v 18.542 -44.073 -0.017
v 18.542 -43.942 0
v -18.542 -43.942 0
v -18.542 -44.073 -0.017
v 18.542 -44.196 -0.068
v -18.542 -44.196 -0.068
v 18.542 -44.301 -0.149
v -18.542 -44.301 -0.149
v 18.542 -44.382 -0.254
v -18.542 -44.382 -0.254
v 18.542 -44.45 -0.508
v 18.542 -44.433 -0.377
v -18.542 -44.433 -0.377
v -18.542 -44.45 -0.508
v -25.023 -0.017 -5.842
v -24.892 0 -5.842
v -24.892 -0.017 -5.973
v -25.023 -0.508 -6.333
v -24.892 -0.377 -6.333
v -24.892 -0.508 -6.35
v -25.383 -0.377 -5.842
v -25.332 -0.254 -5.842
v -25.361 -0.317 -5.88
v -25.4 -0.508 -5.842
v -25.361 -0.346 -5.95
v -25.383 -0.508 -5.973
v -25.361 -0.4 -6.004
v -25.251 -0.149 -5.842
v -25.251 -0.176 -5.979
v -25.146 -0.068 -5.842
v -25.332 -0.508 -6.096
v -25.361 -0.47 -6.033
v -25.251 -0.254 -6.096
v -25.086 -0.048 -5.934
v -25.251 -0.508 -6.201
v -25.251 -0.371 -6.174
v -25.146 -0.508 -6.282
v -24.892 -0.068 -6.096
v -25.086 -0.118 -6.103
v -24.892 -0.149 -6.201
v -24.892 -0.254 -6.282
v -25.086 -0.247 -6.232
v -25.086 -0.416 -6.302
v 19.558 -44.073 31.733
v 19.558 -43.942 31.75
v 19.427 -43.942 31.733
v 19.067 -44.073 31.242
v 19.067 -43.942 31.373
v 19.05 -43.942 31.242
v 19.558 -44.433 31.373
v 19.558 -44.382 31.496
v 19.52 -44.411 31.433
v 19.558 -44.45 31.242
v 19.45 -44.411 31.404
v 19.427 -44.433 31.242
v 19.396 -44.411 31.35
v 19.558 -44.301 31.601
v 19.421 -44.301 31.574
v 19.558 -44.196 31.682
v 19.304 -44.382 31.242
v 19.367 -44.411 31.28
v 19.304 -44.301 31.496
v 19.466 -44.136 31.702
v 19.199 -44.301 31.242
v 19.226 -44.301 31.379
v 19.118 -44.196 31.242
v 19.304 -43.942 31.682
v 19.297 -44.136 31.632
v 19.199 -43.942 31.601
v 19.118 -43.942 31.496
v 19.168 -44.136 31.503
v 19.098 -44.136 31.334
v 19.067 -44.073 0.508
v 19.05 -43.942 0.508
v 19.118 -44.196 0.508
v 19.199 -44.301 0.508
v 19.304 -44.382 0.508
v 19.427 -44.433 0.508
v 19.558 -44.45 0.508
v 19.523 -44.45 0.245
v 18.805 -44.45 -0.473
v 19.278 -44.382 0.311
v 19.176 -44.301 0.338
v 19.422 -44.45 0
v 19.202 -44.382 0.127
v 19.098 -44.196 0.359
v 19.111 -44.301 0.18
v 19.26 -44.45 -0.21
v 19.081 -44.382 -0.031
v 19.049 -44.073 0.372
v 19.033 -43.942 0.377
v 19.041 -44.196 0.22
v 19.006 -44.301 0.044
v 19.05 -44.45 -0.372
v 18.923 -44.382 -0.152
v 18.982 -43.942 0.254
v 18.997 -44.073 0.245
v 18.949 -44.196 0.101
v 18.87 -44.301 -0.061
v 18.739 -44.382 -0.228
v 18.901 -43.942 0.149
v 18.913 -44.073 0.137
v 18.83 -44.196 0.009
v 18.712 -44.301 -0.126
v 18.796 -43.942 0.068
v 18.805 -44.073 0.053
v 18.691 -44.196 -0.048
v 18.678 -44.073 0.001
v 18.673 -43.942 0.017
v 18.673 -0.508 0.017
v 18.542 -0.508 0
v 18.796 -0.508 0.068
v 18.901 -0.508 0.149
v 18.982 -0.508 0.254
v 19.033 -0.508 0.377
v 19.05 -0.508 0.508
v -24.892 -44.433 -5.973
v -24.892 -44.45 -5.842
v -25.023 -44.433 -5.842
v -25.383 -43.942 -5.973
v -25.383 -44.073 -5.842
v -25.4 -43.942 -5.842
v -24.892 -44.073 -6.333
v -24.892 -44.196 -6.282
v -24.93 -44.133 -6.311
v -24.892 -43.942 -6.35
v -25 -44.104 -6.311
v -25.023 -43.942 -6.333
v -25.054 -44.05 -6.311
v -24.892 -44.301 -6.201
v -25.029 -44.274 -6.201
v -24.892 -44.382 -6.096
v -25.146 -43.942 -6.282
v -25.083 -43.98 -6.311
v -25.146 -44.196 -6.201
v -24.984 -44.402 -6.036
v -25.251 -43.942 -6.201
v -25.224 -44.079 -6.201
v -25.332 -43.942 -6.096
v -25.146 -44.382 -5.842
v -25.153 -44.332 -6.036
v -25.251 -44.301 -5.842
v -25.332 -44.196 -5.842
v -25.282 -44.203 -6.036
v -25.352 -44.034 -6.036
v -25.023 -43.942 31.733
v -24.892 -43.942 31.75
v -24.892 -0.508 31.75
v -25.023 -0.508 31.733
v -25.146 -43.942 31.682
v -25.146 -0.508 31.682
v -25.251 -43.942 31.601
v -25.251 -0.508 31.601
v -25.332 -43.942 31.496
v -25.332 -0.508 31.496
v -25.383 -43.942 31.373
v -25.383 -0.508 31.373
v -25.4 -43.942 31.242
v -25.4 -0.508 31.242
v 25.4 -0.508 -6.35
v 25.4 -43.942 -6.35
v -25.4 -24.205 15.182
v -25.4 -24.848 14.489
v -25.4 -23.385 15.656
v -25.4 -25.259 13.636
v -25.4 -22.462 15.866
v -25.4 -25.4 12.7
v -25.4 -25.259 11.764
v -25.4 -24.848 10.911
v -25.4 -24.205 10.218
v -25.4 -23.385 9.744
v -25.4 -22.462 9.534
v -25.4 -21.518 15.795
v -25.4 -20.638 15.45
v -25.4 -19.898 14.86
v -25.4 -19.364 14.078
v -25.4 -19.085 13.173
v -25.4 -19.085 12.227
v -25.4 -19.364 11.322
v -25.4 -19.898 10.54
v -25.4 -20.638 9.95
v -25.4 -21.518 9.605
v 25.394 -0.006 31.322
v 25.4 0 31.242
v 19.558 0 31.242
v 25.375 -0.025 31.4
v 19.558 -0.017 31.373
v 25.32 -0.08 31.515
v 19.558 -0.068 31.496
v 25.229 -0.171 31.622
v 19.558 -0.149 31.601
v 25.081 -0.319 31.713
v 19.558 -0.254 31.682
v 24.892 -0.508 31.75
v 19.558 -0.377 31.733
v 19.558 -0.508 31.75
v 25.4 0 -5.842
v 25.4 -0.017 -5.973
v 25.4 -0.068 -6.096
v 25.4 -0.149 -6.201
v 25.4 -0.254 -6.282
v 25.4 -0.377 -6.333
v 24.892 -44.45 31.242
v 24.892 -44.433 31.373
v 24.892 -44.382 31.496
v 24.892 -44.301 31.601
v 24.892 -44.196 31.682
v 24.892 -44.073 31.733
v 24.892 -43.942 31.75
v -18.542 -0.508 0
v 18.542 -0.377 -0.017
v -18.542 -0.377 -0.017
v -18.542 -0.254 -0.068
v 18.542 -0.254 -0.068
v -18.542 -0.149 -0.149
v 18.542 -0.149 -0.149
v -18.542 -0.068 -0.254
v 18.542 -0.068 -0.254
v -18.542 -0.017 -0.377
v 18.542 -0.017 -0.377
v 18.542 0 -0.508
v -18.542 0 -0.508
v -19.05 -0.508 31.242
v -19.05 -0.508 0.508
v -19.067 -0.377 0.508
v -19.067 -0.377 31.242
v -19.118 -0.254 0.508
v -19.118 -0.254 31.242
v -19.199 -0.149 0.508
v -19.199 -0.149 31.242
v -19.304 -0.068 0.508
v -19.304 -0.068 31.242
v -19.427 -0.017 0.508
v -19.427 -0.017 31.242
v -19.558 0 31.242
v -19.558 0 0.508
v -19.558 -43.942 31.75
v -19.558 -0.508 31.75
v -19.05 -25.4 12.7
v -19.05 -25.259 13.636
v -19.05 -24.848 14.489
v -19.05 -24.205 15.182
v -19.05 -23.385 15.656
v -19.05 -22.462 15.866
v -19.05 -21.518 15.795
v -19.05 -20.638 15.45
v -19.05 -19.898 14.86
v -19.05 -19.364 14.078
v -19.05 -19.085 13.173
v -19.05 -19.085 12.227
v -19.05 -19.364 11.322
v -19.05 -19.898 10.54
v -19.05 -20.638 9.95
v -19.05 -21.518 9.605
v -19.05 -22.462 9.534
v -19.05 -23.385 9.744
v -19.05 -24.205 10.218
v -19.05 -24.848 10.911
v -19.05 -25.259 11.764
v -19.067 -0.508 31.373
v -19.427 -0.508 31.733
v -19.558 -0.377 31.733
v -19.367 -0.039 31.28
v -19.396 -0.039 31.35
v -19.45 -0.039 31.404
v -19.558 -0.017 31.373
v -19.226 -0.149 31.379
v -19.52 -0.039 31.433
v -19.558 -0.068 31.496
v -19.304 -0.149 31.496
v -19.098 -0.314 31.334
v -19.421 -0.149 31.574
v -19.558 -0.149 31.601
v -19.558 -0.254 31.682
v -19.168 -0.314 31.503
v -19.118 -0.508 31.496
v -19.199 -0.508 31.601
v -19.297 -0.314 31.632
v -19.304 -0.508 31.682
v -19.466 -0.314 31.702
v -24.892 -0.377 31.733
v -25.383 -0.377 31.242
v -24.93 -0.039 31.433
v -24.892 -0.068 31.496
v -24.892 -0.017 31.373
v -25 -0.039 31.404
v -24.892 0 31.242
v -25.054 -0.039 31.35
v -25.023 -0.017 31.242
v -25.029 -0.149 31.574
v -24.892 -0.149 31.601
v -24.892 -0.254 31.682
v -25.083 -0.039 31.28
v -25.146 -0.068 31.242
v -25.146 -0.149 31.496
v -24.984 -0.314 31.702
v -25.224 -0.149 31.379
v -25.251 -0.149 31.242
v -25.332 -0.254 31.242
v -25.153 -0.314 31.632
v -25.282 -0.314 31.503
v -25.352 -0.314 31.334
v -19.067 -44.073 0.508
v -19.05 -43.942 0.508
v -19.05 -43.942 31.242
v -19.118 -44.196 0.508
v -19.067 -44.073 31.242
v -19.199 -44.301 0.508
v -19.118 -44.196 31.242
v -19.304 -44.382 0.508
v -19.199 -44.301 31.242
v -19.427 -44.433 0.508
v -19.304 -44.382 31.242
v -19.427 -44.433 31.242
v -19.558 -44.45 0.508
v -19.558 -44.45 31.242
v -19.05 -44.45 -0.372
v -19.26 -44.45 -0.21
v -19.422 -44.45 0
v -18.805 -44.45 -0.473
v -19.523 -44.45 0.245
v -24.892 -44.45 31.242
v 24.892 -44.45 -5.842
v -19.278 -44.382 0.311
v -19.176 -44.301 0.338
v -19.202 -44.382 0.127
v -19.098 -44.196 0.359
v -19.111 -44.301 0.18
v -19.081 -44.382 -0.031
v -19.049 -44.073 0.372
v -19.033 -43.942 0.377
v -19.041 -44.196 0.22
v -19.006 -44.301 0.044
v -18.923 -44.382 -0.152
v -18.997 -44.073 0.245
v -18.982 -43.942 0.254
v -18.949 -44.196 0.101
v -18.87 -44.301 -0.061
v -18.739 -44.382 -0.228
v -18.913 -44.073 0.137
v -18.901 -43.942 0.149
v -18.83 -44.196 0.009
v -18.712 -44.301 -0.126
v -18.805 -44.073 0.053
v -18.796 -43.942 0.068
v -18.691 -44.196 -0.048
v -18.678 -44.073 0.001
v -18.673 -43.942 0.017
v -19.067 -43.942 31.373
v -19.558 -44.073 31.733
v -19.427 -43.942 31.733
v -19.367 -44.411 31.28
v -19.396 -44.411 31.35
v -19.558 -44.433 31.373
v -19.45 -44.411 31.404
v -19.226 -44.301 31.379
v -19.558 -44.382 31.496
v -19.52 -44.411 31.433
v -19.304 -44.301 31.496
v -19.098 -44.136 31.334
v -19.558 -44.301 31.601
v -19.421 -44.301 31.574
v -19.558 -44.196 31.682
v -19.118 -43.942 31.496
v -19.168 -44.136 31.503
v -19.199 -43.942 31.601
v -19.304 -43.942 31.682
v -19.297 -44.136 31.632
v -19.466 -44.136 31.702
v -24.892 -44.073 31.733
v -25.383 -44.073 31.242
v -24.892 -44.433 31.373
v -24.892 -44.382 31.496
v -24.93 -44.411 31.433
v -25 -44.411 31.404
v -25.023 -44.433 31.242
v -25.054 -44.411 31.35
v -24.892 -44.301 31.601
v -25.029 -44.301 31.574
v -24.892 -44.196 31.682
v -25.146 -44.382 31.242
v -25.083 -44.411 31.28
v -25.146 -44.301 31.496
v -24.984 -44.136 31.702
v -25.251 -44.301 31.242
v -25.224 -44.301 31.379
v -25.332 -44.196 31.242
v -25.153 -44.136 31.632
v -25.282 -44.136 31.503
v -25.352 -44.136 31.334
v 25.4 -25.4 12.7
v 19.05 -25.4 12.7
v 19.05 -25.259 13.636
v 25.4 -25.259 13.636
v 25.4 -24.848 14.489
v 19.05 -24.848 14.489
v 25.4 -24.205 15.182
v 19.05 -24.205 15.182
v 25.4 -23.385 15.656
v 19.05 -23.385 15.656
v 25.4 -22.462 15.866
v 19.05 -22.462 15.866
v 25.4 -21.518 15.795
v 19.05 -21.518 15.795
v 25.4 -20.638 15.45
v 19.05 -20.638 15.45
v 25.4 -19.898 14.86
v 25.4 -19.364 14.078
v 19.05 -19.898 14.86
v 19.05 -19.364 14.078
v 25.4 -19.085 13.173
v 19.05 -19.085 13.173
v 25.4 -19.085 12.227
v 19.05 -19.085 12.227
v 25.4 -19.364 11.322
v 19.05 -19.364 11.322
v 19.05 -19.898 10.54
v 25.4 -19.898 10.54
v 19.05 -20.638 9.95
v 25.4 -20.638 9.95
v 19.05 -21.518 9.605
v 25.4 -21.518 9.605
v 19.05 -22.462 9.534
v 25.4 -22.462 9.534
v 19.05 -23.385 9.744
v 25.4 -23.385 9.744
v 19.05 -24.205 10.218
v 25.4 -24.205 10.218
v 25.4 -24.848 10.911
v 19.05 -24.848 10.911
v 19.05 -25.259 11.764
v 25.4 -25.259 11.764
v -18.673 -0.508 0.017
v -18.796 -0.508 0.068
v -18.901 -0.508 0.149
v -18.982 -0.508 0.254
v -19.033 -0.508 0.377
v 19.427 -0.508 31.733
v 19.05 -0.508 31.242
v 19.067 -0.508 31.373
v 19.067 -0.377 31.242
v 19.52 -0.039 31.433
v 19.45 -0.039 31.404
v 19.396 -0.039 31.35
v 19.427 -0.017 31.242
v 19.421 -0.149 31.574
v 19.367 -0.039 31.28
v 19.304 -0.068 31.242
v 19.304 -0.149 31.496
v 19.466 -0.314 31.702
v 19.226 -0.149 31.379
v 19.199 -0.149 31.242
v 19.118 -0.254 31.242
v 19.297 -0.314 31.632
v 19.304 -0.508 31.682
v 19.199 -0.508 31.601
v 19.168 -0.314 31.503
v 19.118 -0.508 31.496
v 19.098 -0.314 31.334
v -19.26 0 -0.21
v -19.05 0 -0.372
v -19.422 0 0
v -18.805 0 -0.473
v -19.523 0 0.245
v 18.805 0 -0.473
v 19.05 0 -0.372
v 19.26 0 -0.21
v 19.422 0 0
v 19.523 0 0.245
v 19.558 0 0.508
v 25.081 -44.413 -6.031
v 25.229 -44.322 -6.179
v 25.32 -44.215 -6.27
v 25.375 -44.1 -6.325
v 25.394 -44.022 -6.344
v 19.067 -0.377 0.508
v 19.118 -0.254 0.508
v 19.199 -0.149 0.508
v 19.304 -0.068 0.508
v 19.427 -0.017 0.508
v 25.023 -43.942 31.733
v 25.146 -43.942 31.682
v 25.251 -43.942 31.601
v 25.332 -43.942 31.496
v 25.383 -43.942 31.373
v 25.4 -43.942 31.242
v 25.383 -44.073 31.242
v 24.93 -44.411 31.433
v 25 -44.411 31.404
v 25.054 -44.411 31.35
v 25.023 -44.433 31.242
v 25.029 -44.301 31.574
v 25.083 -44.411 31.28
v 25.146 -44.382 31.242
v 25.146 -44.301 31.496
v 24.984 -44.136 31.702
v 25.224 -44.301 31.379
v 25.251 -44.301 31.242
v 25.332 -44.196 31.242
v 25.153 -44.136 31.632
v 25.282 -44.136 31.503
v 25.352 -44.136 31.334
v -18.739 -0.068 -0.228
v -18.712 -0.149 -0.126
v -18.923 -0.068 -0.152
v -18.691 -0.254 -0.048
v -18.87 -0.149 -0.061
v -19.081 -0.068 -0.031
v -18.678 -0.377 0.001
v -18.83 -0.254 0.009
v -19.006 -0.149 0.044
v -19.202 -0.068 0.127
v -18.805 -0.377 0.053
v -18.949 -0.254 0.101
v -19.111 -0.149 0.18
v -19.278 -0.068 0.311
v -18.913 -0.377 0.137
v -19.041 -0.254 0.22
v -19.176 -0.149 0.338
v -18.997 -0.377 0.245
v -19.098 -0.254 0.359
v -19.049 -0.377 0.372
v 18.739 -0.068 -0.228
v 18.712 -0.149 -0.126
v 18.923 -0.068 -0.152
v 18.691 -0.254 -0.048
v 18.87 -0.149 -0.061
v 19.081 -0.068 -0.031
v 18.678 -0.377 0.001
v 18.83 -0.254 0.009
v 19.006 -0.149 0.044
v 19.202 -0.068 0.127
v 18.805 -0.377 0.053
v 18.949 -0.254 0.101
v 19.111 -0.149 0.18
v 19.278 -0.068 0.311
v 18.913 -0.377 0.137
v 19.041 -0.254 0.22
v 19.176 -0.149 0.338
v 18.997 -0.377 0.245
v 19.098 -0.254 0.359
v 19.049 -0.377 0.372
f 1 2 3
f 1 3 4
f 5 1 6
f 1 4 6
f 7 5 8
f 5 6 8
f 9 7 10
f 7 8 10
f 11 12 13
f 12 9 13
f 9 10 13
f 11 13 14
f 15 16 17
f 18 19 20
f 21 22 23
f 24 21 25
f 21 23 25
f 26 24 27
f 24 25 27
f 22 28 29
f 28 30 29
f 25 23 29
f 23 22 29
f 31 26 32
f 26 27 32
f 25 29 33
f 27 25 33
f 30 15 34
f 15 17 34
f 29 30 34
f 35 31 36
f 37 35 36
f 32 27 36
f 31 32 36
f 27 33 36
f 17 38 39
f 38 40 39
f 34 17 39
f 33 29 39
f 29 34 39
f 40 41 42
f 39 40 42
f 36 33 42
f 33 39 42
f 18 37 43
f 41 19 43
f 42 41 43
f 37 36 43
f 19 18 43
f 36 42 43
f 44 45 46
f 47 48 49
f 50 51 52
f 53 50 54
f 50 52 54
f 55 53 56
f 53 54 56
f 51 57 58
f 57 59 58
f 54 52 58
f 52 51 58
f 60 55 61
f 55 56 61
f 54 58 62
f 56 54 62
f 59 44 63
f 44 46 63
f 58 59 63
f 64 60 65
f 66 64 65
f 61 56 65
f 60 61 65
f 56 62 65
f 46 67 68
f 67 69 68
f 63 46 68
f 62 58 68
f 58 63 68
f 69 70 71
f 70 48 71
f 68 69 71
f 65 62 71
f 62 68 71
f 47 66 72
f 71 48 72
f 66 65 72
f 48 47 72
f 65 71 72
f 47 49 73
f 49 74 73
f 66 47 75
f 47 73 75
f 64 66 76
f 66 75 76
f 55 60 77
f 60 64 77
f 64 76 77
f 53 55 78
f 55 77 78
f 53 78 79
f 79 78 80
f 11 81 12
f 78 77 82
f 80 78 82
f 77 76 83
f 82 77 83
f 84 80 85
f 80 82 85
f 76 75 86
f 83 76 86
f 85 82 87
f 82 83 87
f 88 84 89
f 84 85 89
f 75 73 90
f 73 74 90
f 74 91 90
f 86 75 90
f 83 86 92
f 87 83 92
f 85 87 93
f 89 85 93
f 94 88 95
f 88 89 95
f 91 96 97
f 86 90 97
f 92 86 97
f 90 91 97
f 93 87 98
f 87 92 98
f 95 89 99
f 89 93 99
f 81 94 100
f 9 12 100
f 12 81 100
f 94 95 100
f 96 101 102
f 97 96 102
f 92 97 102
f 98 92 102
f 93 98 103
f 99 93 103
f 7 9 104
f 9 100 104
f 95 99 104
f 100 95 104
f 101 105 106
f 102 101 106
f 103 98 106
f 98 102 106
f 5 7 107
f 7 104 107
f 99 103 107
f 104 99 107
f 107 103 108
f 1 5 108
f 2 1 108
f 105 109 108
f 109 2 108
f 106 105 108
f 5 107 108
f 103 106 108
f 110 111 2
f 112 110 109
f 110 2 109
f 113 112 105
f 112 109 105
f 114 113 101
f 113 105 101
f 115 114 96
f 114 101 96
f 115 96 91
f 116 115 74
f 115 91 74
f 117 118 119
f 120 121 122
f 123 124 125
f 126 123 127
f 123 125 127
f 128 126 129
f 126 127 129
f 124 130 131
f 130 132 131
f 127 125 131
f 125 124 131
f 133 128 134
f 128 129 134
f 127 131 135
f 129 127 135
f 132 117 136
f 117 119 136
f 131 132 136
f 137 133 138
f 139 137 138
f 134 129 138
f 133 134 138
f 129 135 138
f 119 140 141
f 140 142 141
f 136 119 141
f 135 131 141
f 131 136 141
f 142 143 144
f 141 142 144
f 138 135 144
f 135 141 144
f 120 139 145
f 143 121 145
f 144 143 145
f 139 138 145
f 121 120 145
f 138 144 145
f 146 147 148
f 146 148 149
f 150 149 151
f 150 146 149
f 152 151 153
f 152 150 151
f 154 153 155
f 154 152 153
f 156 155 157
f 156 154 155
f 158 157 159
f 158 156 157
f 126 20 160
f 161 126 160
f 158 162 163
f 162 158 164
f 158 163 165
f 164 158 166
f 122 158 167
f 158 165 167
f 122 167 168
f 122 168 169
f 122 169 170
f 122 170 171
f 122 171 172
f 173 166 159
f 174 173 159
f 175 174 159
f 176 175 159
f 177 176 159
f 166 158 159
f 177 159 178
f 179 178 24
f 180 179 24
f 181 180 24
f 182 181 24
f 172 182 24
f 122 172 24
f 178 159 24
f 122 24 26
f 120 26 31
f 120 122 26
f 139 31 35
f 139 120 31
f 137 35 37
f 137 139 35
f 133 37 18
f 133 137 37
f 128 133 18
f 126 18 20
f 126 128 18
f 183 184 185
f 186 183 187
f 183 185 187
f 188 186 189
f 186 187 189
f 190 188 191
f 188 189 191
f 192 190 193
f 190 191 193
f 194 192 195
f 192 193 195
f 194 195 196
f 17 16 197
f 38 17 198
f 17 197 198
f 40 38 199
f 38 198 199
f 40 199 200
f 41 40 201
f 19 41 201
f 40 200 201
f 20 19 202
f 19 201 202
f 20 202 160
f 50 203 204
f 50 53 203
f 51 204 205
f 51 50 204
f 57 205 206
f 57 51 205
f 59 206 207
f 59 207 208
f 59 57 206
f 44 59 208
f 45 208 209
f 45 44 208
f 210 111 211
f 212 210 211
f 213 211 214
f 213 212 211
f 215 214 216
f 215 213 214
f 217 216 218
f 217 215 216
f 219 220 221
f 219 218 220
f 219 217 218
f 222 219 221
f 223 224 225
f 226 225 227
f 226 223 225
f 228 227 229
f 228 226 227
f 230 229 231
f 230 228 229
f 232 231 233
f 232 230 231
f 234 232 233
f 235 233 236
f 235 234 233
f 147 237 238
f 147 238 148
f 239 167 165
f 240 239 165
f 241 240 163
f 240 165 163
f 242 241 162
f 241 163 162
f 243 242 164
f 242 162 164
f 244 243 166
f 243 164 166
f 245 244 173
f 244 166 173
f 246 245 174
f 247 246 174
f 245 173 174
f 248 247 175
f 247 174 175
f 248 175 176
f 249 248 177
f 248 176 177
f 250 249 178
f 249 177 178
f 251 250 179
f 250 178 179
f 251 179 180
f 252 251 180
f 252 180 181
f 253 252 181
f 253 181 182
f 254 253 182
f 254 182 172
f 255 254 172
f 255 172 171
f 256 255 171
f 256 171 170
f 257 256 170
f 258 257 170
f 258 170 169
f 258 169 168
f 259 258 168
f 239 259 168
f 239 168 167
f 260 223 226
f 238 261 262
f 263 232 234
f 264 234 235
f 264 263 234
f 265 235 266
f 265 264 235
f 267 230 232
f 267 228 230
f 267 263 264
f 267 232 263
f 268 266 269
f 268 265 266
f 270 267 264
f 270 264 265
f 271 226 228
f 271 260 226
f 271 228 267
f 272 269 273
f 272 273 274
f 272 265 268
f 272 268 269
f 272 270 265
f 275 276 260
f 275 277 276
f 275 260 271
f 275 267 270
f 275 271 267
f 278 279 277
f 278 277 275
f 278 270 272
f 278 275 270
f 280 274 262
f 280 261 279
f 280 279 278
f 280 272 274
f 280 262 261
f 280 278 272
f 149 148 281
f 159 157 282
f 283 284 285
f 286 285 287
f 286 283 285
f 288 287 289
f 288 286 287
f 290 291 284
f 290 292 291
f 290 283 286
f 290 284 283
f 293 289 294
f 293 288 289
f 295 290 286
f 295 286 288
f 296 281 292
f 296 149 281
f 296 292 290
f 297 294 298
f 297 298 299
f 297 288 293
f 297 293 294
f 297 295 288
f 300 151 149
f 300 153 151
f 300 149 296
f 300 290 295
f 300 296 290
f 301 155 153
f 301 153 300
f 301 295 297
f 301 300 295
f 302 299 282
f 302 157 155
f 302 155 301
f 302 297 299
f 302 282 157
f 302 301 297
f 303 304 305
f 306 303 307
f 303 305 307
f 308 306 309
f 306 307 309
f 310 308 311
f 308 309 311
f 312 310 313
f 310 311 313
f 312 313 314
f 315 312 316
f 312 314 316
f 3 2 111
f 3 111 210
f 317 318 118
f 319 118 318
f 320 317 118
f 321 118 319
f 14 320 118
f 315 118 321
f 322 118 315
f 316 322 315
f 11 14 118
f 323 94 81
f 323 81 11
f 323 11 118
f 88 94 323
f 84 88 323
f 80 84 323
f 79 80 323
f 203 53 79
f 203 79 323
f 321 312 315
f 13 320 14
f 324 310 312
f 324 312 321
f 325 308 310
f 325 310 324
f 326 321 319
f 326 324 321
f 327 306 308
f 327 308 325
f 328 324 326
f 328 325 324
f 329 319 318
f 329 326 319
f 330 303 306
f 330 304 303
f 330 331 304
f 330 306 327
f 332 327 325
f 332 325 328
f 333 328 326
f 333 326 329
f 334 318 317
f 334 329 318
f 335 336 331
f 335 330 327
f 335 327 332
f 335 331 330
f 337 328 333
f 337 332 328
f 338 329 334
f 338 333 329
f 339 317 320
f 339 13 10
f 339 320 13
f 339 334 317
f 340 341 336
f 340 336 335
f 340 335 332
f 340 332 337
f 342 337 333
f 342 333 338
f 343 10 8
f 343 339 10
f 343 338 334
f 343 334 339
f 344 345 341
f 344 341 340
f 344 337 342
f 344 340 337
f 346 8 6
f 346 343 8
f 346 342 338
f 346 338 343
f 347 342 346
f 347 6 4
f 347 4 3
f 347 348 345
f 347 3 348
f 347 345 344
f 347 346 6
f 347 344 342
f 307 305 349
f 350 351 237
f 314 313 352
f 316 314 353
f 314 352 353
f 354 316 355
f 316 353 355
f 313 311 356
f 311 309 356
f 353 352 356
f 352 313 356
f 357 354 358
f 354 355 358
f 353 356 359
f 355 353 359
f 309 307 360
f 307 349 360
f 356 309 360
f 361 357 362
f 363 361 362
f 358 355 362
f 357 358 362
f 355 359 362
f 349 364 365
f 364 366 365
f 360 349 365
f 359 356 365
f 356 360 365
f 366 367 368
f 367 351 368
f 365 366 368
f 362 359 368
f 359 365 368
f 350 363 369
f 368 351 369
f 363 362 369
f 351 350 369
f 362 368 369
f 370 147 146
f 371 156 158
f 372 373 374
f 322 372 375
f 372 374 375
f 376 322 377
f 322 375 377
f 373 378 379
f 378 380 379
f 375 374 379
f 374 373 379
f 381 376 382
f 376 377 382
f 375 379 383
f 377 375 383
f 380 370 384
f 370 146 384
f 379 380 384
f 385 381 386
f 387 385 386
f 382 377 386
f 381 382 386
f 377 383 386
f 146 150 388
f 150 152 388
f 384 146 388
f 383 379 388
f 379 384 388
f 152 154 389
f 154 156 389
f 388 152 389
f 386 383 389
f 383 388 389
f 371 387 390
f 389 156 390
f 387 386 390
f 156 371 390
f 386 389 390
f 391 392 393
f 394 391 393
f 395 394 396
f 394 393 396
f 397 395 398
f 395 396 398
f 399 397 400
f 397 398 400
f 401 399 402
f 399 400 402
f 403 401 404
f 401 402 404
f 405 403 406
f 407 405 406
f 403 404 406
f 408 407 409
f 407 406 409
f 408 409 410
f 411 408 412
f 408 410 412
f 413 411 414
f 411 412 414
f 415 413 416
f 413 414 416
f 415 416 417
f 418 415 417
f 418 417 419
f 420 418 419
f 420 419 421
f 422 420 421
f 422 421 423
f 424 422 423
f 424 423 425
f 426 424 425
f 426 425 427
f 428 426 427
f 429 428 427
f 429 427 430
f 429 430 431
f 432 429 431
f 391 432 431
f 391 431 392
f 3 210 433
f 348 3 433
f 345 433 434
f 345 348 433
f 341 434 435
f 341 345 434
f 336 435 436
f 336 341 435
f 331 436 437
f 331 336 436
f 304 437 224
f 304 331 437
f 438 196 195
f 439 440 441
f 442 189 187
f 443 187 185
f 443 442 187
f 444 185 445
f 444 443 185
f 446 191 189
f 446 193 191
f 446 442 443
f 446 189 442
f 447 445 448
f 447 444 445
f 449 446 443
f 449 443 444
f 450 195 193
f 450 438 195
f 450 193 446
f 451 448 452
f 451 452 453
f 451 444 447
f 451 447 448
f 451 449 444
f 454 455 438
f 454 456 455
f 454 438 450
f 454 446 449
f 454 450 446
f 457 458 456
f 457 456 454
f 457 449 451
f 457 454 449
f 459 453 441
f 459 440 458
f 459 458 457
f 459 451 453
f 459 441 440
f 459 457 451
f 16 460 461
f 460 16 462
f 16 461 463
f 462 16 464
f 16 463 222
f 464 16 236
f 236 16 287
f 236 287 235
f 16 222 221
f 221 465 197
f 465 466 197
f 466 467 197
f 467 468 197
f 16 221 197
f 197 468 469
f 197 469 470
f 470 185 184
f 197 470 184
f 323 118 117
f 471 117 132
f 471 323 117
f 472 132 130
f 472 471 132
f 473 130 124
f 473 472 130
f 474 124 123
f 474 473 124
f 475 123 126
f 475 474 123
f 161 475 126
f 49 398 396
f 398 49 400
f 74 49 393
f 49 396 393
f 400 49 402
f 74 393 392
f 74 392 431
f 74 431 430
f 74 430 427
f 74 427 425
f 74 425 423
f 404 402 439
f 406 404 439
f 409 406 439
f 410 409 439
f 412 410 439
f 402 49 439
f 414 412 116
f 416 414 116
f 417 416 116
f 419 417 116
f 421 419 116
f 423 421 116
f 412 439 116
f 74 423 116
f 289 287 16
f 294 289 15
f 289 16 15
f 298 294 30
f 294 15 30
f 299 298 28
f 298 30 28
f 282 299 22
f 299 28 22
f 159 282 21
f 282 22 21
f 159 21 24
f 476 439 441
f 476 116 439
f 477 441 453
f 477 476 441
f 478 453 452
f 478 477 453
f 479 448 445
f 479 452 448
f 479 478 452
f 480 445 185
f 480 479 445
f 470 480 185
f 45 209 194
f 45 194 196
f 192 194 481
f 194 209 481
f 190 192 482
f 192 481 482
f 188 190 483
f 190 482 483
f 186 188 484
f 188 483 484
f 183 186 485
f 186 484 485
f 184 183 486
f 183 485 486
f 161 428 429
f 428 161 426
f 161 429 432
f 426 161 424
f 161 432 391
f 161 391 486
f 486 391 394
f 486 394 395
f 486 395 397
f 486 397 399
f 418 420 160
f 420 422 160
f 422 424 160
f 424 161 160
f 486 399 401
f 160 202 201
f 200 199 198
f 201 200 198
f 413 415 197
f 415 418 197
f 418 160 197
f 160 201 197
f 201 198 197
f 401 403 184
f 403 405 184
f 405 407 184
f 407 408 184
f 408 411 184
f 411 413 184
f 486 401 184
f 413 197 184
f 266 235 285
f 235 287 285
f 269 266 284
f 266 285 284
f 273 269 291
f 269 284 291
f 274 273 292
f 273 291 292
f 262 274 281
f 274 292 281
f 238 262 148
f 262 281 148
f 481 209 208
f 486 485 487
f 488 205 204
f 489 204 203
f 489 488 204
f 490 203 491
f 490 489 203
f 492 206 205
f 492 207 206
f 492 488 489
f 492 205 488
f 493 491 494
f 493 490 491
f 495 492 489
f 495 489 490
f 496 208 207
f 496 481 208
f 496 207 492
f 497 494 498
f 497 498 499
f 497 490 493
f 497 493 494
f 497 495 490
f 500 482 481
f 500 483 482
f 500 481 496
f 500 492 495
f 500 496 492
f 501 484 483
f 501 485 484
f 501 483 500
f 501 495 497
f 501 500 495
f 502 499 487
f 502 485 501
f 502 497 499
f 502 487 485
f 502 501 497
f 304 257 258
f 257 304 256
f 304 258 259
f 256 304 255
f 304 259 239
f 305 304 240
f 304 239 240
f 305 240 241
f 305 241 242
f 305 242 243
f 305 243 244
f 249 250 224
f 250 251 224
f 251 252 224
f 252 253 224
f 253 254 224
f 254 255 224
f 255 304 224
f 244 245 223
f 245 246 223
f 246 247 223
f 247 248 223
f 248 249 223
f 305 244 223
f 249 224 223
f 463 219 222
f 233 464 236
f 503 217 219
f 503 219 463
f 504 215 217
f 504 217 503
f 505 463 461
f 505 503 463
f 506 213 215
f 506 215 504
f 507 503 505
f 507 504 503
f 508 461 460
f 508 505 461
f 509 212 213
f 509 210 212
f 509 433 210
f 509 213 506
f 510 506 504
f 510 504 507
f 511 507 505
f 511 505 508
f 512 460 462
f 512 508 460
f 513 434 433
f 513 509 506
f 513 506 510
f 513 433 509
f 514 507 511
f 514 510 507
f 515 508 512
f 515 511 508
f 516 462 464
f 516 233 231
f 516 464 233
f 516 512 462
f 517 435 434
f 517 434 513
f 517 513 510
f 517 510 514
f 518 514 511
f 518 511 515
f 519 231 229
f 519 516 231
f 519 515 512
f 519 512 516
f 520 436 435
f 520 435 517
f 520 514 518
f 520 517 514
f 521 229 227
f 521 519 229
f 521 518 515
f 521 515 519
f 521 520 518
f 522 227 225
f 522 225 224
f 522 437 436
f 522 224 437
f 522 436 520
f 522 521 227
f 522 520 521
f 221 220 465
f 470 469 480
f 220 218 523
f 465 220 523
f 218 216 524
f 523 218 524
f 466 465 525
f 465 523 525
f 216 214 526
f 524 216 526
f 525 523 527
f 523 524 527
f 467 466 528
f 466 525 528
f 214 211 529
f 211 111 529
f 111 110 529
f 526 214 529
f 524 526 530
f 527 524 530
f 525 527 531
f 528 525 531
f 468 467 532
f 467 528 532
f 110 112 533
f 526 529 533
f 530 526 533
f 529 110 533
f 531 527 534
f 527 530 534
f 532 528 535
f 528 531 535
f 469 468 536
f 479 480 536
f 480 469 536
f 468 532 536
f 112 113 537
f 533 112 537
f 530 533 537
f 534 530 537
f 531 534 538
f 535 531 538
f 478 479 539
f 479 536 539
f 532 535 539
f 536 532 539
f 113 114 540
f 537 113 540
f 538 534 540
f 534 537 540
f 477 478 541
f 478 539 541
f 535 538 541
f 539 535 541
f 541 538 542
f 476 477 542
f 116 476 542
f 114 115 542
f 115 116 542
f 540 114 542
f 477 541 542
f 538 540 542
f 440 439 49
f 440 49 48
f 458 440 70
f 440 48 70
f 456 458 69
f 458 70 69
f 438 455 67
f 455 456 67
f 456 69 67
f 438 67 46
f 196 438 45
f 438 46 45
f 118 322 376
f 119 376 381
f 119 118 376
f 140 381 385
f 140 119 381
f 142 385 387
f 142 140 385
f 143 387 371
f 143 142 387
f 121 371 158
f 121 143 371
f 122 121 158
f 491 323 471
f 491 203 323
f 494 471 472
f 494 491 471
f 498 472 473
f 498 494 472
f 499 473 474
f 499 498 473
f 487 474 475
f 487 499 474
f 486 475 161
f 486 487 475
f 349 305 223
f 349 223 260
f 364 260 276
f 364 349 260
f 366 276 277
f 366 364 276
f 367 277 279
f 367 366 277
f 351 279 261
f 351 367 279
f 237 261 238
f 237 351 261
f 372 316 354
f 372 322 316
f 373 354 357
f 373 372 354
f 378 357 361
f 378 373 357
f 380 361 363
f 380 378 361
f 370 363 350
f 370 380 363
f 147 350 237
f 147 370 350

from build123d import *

# Parameters (mm, degrees)
F1_DEPTH = 44.45
F3_D     = 6.35
F4_R     = 0.508


with BuildPart() as f1:
    # F0 (on Front) → F1 (new body)
    with BuildSketch(Plane.XZ):
        Polygon((19.05, 0), (0, 0), (-19.05, 0), (-19.05, 31.75), (-25.4, 31.75), (-25.4, -6.35), (25.4, -6.35), (25.4, 31.75), (19.05, 31.75), align=None)
    extrude(amount=F1_DEPTH)

    # F3 (through all)
    with Locations(Plane.YZ.offset(25.4)):
        with Locations((-22.225, 12.7)):
            Hole(F3_D / 2)

    # F4
    f4_edges = [f1.edges().sort_by_distance(p)[0] for p in [
        (-19.05, -22.225, 31.75),
        (19.05, -22.225, 31.75),
        (25.4, -22.225, 31.75),
        (22.225, -44.45, 31.75),
        (22.225, 0, 31.75),
        (25.4, -44.45, 12.7),
        (19.05, -44.45, 15.875),
        (0, -44.45, 0),
        (19.05, -22.225, 0),
        (-19.05, -22.225, 0),
        (0, 0, 0),
        (-19.05, -44.45, 15.875),
        (-19.05, 0, 15.875),
        (-25.4, -22.225, 31.75),
        (-22.225, 0, 31.75),
        (-22.225, -44.45, 31.75),
        (-25.4, -44.45, 12.7),
        (0, -44.45, -6.35),
        (0, 0, -6.35),
        (-25.4, 0, 12.7),
        (19.05, 0, 15.875),
        (-25.4, -22.225, -6.35),
    ]]
    fillet(f4_edges, radius=F4_R)


solid = f1.part
